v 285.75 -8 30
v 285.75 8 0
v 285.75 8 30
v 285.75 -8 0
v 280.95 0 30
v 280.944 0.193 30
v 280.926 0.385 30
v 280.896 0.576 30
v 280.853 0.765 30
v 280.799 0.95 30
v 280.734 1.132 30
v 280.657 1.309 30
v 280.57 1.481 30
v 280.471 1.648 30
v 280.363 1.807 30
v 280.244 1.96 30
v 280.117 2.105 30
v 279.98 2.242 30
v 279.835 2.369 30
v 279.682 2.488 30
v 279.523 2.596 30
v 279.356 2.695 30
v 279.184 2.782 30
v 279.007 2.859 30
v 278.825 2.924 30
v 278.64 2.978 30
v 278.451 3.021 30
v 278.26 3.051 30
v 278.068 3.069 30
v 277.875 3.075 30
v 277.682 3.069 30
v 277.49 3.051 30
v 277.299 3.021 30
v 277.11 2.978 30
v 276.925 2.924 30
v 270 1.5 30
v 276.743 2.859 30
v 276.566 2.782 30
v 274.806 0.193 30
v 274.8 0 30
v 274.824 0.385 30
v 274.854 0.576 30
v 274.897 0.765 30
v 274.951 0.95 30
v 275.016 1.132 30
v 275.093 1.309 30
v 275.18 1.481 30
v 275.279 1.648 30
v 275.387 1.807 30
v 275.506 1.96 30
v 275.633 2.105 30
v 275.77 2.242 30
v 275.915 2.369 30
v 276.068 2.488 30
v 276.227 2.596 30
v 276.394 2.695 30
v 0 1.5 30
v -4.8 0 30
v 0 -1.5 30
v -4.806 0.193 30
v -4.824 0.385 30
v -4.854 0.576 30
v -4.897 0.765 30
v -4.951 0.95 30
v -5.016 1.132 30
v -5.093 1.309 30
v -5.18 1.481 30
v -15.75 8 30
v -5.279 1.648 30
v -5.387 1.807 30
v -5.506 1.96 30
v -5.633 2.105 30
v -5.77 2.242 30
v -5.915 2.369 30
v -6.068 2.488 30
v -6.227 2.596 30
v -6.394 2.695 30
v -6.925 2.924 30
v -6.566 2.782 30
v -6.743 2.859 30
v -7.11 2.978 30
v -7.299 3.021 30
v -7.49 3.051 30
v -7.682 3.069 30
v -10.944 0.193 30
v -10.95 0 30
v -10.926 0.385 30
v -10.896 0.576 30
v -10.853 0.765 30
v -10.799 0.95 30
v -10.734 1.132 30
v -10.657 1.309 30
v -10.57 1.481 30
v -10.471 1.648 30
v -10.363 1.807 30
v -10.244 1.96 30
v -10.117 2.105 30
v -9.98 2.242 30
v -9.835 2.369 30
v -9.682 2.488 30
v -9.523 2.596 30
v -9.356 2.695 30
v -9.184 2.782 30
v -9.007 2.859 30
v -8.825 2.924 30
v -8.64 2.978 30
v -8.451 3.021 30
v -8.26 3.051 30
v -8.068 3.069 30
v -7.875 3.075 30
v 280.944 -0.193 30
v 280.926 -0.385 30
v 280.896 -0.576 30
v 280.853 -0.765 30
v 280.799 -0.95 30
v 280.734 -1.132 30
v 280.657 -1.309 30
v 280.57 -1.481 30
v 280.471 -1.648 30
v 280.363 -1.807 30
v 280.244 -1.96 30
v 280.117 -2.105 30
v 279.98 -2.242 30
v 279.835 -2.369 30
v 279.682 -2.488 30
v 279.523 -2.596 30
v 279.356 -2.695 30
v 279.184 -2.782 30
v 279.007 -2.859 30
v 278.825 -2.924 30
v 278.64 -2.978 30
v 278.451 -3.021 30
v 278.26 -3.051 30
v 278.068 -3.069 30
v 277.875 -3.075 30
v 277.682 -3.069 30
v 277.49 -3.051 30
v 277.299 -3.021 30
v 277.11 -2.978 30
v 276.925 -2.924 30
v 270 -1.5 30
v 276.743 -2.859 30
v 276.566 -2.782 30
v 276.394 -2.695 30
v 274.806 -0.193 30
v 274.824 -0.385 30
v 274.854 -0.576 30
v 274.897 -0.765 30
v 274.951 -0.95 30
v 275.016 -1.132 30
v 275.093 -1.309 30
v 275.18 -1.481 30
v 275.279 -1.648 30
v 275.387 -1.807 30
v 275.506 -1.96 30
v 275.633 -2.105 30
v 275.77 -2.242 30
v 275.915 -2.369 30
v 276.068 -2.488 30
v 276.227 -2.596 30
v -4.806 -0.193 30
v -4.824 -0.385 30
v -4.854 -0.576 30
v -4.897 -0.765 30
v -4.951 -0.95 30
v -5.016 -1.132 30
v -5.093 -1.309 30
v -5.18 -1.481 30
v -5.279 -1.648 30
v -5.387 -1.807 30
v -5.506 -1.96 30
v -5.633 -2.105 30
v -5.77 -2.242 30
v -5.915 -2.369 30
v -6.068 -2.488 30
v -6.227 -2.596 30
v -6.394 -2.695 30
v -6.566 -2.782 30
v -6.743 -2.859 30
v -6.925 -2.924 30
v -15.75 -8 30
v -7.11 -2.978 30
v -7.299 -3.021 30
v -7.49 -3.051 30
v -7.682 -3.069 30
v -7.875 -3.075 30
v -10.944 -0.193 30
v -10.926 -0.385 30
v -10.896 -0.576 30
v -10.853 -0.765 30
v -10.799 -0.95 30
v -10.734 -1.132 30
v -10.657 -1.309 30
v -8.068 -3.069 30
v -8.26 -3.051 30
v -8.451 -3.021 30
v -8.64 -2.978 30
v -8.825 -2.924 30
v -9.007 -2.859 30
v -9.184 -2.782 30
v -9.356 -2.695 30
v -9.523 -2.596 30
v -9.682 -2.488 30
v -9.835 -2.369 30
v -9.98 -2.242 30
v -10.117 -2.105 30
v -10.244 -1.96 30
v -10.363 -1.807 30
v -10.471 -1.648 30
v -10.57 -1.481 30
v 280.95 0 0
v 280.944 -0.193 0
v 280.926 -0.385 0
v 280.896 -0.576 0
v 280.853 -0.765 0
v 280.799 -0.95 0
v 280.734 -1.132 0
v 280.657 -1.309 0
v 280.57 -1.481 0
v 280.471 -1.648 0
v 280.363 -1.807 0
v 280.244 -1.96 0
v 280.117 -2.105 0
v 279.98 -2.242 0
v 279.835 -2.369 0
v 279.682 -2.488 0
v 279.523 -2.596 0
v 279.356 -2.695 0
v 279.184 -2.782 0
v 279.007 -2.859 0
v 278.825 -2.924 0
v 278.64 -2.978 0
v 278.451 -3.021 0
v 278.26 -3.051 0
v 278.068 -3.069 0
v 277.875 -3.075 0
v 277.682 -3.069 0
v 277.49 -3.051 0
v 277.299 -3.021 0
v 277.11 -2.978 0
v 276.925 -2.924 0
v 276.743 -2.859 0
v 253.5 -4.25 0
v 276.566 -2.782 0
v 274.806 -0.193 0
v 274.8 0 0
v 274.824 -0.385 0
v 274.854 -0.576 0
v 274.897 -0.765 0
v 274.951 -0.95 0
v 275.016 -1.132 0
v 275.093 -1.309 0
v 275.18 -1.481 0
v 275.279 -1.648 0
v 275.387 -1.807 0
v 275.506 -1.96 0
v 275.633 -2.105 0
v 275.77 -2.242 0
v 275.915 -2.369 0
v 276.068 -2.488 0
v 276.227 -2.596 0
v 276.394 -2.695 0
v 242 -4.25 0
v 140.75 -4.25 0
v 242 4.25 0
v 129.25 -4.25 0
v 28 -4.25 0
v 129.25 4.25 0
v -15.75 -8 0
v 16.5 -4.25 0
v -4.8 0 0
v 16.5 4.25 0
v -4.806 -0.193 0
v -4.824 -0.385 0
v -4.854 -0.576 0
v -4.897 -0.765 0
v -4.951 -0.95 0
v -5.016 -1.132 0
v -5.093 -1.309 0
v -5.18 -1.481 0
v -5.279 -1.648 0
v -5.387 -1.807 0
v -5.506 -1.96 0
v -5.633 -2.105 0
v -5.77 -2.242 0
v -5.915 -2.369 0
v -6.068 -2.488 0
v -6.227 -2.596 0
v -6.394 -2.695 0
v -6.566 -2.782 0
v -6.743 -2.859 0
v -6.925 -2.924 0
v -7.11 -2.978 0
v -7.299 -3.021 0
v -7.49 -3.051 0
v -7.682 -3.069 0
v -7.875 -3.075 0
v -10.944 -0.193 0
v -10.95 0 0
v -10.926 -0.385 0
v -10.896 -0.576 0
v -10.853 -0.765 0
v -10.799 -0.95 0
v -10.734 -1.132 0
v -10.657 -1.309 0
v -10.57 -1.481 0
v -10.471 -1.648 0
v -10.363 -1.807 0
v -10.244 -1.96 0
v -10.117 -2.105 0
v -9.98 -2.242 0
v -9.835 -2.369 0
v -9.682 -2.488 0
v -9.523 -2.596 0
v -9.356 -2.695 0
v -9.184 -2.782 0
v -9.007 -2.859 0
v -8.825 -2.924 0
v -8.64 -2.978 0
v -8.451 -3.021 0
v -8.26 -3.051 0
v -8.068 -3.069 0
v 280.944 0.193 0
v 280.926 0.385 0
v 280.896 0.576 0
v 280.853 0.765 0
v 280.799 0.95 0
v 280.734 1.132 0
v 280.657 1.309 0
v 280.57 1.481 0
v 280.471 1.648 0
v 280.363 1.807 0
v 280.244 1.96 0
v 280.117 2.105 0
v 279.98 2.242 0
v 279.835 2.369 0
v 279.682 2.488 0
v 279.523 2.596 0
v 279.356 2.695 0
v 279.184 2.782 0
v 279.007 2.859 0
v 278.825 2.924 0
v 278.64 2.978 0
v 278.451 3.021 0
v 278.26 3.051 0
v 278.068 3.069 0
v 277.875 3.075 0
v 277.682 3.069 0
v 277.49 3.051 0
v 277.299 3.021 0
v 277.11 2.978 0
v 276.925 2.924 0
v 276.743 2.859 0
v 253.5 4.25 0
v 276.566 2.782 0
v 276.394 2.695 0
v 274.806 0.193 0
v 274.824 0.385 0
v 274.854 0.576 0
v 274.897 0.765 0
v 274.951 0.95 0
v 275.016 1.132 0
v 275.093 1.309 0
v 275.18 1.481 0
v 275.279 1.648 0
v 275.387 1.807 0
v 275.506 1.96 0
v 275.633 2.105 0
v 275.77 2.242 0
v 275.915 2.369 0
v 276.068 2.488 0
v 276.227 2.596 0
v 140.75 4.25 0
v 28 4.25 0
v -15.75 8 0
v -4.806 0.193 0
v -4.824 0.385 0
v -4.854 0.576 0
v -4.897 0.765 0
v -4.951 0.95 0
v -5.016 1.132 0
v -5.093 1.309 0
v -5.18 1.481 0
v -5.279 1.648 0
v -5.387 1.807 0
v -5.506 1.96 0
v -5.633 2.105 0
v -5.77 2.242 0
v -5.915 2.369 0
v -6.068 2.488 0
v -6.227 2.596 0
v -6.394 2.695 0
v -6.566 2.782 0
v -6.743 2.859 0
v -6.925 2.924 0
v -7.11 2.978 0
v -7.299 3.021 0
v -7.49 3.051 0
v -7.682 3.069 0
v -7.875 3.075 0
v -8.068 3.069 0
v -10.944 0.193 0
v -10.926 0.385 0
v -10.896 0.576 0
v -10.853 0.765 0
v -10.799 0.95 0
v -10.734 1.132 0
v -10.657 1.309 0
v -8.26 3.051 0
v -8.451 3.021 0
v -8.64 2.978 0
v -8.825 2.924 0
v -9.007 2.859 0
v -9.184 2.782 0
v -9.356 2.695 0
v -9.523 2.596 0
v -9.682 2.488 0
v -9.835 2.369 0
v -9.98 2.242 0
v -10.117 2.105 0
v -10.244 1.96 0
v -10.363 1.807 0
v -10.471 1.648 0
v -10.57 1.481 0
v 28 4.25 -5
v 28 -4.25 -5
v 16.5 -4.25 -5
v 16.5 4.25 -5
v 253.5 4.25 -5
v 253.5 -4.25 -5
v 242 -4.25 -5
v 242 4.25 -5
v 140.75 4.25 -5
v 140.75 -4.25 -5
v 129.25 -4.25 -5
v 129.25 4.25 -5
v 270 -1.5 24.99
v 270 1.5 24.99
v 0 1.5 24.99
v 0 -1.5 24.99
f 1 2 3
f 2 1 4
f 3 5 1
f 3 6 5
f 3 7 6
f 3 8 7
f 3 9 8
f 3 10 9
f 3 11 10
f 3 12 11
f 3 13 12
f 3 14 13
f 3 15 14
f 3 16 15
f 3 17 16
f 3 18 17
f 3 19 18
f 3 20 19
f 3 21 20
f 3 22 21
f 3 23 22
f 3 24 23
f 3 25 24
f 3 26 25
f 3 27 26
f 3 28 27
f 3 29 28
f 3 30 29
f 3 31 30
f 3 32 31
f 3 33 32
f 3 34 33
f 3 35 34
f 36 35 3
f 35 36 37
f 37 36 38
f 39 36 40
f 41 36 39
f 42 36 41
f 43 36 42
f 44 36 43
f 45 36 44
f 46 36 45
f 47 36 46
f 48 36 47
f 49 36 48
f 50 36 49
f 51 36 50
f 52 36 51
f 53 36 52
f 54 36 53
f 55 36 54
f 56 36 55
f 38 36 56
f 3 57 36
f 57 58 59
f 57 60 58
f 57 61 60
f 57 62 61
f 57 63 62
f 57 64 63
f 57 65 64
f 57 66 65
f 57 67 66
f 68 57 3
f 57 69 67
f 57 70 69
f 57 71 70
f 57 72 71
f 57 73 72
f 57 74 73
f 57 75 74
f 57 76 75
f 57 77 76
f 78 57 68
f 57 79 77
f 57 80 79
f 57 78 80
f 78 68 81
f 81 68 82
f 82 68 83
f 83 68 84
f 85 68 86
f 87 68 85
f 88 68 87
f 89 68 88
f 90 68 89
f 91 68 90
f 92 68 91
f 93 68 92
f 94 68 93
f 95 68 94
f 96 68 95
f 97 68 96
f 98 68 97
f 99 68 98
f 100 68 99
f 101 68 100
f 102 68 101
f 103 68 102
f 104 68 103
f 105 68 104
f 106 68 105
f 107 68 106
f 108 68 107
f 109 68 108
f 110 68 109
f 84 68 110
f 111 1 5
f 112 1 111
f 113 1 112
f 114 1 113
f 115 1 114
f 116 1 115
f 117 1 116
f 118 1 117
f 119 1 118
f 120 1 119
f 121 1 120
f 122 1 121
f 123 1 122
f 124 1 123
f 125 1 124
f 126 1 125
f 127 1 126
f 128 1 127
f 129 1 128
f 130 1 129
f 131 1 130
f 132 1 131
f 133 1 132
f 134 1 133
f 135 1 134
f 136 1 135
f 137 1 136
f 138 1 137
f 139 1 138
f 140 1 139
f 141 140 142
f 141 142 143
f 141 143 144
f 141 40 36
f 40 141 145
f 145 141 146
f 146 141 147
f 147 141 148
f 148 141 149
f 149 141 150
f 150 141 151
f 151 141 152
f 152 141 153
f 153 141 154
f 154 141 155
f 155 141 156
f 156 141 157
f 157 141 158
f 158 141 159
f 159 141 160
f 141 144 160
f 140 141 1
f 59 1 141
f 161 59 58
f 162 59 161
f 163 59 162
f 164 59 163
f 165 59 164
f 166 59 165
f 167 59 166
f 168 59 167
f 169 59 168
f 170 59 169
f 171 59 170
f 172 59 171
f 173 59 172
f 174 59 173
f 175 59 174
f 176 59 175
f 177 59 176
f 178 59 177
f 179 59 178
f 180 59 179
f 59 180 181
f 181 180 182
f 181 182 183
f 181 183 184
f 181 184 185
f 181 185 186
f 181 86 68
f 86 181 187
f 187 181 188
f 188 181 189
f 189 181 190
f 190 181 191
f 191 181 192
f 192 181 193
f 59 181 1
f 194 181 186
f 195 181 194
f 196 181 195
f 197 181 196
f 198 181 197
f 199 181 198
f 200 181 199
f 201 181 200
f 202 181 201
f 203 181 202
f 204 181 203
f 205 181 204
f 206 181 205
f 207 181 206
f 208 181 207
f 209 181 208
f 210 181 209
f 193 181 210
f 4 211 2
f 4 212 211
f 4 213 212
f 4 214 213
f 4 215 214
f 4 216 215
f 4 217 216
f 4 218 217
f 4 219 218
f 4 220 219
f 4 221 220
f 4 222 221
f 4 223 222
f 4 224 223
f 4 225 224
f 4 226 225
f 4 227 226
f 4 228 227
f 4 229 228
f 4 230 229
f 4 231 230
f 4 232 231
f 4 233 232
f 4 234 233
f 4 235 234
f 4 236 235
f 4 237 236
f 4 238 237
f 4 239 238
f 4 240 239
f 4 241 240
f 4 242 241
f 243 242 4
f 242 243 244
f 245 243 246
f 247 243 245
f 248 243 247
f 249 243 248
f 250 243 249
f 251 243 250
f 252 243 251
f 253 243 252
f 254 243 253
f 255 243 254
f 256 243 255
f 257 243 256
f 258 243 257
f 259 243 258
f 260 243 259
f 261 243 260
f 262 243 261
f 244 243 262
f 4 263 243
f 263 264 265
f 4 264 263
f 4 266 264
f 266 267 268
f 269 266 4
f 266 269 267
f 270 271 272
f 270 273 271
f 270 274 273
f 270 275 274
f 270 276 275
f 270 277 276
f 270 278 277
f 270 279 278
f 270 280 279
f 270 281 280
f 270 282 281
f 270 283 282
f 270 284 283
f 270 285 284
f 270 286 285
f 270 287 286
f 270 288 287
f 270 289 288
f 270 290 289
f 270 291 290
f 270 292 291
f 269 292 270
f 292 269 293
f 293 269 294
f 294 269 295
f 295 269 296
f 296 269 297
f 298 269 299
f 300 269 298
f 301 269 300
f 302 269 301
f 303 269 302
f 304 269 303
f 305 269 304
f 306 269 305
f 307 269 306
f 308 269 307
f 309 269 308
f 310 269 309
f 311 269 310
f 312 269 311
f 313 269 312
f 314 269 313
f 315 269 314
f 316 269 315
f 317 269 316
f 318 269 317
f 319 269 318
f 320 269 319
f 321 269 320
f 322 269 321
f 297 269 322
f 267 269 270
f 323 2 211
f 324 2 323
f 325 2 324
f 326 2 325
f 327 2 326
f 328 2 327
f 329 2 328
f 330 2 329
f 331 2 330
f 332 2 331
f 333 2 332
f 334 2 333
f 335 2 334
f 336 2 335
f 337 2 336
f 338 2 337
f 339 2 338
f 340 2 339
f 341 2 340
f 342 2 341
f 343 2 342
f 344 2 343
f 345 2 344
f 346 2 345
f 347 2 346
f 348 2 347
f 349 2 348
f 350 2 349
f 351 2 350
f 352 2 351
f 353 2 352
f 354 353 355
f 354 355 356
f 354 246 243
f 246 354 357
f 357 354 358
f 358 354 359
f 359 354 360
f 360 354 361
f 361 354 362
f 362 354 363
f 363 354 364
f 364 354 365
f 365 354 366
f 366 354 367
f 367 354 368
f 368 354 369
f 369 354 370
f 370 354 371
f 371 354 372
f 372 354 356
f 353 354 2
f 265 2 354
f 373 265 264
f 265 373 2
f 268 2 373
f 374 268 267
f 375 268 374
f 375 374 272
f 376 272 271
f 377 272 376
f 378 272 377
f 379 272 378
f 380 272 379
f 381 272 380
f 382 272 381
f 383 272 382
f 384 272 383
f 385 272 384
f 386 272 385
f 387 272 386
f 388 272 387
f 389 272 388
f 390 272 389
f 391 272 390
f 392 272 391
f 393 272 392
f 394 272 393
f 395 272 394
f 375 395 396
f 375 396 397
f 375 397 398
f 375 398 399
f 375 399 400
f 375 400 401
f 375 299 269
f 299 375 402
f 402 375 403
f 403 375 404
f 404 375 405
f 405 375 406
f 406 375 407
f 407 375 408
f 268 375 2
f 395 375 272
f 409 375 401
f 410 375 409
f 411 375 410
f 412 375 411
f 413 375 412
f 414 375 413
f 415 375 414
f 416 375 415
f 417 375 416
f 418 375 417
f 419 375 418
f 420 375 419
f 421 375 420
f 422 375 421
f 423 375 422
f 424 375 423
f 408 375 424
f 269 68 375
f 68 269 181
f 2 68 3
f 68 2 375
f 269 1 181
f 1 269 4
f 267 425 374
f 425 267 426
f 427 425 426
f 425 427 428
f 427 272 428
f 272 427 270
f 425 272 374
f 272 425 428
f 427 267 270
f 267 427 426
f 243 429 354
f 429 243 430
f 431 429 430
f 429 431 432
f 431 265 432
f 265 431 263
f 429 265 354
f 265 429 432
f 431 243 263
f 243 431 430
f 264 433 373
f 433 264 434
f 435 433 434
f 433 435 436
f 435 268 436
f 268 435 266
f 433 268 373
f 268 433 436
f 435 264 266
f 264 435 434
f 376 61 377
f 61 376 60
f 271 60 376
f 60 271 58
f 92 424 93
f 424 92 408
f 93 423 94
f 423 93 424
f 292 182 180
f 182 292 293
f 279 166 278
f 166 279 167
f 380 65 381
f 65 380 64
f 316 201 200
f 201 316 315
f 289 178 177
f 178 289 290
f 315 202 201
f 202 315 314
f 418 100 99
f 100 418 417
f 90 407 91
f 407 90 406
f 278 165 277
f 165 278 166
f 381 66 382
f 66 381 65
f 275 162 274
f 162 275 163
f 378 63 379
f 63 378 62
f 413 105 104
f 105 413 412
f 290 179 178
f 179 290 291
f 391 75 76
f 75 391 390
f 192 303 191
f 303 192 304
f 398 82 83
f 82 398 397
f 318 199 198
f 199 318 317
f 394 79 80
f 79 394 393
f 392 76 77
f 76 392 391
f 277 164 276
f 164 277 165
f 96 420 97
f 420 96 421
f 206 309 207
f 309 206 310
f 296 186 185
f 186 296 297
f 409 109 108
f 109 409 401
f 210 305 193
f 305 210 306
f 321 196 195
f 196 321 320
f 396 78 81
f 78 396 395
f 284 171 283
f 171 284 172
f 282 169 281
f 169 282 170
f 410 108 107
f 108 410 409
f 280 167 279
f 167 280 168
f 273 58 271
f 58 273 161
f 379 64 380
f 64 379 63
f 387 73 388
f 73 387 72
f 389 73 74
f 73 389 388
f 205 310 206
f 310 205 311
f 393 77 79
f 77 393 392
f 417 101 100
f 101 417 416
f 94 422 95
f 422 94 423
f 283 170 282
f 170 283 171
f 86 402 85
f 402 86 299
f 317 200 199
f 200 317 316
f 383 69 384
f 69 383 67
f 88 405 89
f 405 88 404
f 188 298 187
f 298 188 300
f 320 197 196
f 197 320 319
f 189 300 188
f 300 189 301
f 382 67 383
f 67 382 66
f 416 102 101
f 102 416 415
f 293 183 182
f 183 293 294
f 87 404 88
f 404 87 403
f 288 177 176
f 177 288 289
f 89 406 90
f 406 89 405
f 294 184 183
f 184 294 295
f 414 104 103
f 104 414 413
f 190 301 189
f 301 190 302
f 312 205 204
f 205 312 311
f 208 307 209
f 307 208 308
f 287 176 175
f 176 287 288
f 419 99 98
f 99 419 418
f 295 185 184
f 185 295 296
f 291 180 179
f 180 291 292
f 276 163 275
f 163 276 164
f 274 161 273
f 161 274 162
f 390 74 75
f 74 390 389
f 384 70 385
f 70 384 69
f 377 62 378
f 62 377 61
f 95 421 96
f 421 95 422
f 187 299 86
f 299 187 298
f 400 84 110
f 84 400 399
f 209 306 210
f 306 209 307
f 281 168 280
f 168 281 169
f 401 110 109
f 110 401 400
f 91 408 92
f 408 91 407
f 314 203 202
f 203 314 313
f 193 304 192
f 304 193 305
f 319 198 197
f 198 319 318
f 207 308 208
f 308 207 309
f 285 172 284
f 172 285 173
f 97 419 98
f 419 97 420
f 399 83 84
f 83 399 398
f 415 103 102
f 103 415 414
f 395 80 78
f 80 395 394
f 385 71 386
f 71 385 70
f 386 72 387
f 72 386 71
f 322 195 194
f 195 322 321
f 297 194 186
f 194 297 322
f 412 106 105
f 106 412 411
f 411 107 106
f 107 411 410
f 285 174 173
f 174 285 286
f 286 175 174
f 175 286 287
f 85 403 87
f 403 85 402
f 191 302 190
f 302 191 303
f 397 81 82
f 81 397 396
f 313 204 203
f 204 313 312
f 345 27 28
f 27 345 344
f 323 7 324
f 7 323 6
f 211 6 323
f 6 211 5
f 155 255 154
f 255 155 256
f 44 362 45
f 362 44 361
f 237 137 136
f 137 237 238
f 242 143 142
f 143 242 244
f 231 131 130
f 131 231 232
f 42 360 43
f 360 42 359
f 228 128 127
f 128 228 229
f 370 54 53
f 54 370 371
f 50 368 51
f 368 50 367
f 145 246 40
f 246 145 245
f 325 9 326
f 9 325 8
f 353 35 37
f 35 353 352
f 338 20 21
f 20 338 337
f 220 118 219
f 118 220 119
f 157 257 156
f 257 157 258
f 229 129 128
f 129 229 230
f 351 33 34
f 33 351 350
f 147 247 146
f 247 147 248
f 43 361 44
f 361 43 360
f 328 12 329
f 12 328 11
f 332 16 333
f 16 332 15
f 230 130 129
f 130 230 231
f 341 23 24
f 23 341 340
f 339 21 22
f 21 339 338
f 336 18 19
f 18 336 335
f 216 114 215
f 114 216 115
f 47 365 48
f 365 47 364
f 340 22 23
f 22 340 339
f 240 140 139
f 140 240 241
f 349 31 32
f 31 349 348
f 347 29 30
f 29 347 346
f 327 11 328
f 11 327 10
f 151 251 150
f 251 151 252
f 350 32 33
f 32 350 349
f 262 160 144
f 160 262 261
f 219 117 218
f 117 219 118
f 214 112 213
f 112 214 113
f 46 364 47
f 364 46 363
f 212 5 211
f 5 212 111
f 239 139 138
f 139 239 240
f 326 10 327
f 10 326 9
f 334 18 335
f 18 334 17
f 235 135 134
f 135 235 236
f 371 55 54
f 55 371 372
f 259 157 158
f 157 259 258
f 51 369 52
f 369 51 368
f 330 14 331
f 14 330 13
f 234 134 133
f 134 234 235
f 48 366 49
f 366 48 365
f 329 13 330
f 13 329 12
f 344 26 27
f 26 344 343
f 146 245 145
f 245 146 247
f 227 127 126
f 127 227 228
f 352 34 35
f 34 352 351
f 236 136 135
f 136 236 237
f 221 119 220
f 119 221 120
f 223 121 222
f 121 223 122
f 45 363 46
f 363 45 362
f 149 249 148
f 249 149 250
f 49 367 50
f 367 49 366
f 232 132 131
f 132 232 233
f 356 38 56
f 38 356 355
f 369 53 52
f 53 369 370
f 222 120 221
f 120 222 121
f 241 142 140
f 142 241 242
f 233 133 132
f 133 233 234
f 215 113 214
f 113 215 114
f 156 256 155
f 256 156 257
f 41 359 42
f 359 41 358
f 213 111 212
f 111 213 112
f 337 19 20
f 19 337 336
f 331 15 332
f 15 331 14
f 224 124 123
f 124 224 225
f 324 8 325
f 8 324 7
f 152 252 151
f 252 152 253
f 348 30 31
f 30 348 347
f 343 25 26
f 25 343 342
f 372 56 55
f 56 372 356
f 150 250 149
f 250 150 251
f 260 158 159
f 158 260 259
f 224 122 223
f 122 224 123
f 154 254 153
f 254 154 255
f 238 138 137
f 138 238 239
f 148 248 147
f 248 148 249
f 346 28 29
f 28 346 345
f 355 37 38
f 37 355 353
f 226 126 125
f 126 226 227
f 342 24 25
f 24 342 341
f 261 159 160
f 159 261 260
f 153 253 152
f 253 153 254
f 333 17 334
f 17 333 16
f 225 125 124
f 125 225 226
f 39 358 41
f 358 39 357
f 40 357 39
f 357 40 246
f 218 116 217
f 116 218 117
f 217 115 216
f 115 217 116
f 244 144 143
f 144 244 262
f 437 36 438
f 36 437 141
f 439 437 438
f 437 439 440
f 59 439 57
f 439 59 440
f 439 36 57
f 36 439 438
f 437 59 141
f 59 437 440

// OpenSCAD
// file: strip-wire-lib.scad
module stripWireCuts(wireLength=10,stripInLength=5,stripOutLength=5) {
    translate([stripInLength - toolR, -toolWidth - (wireD / 2)]) {
        square([toolWidth, 2 * toolWidth + wireD]);
    }

    translate([stripInLength + wireLength - toolR, -toolWidth - (wireD / 2)]) {
        square([toolWidth, 2 * toolWidth + wireD]);
    }
}

module cutWireCuts(wireLength=10, stripInLength=5,stripOutLength=5) {
    translate([wireLength + stripInLength + stripOutLength, -toolWidth / 2]) {
        square([toolWidth, toolWidth]);
    }
}
// file: strip-wire-measurements.scad
stripLength = 5.2;
toolWidth = 1.5;
toolR = toolWidth / 2;
wireD = 3;
wireLength = 40;
stockLength = 270;
wallThickness = 5;
boltM=3;
sheetThickness = 3;
tThreadM=5.75;
tSlotWidth=8.5;
tSlotDepth=5;
// main file
include <strip-wire-measurements.scad>
include <strip-wire-lib.scad>

paddingWidth = wallThickness * 2 + 2 * toolWidth;
holdWidth = paddingWidth + wireD;

$fn=100;

fullThickness = 2 * wallThickness + 20;


difference() {
    union() {
        translate([ - wallThickness - wallThickness - tThreadM, - wallThickness - toolWidth - (wireD / 2)]) {
            cube([wallThickness * 4 + 2 * tThreadM + stockLength, holdWidth,fullThickness]);
        }

        translate([tThreadM * 2 + wallThickness, -tSlotWidth / 2, -tSlotDepth]) {
            cube([tThreadM * 2, tSlotWidth, tSlotDepth]);  
        }

        translate([stockLength - (tThreadM * 2 + wallThickness) - tThreadM * 2, -tSlotWidth / 2, -tSlotDepth]) {
            cube([tThreadM * 2, tSlotWidth, tSlotDepth]);  
        }

        translate([stockLength / 2 - tThreadM, -tSlotWidth / 2, -tSlotDepth]) {
            cube([tThreadM * 2, tSlotWidth, tSlotDepth]);  
        }
    }

    translate([-wallThickness - tThreadM / 2, 0, -0.01]) {
        cylinder(r=tThreadM/2+0.2,h=fullThickness + 0.02);
    }

    translate([stockLength + wallThickness + tThreadM / 2, 0, -0.01]) {
        cylinder(r=tThreadM/2+0.2,h=fullThickness + 0.02);
    }

    translate([0, -wireD/2, fullThickness - wallThickness - 0.01]) {
        cube([stockLength, wireD, wallThickness + 0.02]);
    }
}
